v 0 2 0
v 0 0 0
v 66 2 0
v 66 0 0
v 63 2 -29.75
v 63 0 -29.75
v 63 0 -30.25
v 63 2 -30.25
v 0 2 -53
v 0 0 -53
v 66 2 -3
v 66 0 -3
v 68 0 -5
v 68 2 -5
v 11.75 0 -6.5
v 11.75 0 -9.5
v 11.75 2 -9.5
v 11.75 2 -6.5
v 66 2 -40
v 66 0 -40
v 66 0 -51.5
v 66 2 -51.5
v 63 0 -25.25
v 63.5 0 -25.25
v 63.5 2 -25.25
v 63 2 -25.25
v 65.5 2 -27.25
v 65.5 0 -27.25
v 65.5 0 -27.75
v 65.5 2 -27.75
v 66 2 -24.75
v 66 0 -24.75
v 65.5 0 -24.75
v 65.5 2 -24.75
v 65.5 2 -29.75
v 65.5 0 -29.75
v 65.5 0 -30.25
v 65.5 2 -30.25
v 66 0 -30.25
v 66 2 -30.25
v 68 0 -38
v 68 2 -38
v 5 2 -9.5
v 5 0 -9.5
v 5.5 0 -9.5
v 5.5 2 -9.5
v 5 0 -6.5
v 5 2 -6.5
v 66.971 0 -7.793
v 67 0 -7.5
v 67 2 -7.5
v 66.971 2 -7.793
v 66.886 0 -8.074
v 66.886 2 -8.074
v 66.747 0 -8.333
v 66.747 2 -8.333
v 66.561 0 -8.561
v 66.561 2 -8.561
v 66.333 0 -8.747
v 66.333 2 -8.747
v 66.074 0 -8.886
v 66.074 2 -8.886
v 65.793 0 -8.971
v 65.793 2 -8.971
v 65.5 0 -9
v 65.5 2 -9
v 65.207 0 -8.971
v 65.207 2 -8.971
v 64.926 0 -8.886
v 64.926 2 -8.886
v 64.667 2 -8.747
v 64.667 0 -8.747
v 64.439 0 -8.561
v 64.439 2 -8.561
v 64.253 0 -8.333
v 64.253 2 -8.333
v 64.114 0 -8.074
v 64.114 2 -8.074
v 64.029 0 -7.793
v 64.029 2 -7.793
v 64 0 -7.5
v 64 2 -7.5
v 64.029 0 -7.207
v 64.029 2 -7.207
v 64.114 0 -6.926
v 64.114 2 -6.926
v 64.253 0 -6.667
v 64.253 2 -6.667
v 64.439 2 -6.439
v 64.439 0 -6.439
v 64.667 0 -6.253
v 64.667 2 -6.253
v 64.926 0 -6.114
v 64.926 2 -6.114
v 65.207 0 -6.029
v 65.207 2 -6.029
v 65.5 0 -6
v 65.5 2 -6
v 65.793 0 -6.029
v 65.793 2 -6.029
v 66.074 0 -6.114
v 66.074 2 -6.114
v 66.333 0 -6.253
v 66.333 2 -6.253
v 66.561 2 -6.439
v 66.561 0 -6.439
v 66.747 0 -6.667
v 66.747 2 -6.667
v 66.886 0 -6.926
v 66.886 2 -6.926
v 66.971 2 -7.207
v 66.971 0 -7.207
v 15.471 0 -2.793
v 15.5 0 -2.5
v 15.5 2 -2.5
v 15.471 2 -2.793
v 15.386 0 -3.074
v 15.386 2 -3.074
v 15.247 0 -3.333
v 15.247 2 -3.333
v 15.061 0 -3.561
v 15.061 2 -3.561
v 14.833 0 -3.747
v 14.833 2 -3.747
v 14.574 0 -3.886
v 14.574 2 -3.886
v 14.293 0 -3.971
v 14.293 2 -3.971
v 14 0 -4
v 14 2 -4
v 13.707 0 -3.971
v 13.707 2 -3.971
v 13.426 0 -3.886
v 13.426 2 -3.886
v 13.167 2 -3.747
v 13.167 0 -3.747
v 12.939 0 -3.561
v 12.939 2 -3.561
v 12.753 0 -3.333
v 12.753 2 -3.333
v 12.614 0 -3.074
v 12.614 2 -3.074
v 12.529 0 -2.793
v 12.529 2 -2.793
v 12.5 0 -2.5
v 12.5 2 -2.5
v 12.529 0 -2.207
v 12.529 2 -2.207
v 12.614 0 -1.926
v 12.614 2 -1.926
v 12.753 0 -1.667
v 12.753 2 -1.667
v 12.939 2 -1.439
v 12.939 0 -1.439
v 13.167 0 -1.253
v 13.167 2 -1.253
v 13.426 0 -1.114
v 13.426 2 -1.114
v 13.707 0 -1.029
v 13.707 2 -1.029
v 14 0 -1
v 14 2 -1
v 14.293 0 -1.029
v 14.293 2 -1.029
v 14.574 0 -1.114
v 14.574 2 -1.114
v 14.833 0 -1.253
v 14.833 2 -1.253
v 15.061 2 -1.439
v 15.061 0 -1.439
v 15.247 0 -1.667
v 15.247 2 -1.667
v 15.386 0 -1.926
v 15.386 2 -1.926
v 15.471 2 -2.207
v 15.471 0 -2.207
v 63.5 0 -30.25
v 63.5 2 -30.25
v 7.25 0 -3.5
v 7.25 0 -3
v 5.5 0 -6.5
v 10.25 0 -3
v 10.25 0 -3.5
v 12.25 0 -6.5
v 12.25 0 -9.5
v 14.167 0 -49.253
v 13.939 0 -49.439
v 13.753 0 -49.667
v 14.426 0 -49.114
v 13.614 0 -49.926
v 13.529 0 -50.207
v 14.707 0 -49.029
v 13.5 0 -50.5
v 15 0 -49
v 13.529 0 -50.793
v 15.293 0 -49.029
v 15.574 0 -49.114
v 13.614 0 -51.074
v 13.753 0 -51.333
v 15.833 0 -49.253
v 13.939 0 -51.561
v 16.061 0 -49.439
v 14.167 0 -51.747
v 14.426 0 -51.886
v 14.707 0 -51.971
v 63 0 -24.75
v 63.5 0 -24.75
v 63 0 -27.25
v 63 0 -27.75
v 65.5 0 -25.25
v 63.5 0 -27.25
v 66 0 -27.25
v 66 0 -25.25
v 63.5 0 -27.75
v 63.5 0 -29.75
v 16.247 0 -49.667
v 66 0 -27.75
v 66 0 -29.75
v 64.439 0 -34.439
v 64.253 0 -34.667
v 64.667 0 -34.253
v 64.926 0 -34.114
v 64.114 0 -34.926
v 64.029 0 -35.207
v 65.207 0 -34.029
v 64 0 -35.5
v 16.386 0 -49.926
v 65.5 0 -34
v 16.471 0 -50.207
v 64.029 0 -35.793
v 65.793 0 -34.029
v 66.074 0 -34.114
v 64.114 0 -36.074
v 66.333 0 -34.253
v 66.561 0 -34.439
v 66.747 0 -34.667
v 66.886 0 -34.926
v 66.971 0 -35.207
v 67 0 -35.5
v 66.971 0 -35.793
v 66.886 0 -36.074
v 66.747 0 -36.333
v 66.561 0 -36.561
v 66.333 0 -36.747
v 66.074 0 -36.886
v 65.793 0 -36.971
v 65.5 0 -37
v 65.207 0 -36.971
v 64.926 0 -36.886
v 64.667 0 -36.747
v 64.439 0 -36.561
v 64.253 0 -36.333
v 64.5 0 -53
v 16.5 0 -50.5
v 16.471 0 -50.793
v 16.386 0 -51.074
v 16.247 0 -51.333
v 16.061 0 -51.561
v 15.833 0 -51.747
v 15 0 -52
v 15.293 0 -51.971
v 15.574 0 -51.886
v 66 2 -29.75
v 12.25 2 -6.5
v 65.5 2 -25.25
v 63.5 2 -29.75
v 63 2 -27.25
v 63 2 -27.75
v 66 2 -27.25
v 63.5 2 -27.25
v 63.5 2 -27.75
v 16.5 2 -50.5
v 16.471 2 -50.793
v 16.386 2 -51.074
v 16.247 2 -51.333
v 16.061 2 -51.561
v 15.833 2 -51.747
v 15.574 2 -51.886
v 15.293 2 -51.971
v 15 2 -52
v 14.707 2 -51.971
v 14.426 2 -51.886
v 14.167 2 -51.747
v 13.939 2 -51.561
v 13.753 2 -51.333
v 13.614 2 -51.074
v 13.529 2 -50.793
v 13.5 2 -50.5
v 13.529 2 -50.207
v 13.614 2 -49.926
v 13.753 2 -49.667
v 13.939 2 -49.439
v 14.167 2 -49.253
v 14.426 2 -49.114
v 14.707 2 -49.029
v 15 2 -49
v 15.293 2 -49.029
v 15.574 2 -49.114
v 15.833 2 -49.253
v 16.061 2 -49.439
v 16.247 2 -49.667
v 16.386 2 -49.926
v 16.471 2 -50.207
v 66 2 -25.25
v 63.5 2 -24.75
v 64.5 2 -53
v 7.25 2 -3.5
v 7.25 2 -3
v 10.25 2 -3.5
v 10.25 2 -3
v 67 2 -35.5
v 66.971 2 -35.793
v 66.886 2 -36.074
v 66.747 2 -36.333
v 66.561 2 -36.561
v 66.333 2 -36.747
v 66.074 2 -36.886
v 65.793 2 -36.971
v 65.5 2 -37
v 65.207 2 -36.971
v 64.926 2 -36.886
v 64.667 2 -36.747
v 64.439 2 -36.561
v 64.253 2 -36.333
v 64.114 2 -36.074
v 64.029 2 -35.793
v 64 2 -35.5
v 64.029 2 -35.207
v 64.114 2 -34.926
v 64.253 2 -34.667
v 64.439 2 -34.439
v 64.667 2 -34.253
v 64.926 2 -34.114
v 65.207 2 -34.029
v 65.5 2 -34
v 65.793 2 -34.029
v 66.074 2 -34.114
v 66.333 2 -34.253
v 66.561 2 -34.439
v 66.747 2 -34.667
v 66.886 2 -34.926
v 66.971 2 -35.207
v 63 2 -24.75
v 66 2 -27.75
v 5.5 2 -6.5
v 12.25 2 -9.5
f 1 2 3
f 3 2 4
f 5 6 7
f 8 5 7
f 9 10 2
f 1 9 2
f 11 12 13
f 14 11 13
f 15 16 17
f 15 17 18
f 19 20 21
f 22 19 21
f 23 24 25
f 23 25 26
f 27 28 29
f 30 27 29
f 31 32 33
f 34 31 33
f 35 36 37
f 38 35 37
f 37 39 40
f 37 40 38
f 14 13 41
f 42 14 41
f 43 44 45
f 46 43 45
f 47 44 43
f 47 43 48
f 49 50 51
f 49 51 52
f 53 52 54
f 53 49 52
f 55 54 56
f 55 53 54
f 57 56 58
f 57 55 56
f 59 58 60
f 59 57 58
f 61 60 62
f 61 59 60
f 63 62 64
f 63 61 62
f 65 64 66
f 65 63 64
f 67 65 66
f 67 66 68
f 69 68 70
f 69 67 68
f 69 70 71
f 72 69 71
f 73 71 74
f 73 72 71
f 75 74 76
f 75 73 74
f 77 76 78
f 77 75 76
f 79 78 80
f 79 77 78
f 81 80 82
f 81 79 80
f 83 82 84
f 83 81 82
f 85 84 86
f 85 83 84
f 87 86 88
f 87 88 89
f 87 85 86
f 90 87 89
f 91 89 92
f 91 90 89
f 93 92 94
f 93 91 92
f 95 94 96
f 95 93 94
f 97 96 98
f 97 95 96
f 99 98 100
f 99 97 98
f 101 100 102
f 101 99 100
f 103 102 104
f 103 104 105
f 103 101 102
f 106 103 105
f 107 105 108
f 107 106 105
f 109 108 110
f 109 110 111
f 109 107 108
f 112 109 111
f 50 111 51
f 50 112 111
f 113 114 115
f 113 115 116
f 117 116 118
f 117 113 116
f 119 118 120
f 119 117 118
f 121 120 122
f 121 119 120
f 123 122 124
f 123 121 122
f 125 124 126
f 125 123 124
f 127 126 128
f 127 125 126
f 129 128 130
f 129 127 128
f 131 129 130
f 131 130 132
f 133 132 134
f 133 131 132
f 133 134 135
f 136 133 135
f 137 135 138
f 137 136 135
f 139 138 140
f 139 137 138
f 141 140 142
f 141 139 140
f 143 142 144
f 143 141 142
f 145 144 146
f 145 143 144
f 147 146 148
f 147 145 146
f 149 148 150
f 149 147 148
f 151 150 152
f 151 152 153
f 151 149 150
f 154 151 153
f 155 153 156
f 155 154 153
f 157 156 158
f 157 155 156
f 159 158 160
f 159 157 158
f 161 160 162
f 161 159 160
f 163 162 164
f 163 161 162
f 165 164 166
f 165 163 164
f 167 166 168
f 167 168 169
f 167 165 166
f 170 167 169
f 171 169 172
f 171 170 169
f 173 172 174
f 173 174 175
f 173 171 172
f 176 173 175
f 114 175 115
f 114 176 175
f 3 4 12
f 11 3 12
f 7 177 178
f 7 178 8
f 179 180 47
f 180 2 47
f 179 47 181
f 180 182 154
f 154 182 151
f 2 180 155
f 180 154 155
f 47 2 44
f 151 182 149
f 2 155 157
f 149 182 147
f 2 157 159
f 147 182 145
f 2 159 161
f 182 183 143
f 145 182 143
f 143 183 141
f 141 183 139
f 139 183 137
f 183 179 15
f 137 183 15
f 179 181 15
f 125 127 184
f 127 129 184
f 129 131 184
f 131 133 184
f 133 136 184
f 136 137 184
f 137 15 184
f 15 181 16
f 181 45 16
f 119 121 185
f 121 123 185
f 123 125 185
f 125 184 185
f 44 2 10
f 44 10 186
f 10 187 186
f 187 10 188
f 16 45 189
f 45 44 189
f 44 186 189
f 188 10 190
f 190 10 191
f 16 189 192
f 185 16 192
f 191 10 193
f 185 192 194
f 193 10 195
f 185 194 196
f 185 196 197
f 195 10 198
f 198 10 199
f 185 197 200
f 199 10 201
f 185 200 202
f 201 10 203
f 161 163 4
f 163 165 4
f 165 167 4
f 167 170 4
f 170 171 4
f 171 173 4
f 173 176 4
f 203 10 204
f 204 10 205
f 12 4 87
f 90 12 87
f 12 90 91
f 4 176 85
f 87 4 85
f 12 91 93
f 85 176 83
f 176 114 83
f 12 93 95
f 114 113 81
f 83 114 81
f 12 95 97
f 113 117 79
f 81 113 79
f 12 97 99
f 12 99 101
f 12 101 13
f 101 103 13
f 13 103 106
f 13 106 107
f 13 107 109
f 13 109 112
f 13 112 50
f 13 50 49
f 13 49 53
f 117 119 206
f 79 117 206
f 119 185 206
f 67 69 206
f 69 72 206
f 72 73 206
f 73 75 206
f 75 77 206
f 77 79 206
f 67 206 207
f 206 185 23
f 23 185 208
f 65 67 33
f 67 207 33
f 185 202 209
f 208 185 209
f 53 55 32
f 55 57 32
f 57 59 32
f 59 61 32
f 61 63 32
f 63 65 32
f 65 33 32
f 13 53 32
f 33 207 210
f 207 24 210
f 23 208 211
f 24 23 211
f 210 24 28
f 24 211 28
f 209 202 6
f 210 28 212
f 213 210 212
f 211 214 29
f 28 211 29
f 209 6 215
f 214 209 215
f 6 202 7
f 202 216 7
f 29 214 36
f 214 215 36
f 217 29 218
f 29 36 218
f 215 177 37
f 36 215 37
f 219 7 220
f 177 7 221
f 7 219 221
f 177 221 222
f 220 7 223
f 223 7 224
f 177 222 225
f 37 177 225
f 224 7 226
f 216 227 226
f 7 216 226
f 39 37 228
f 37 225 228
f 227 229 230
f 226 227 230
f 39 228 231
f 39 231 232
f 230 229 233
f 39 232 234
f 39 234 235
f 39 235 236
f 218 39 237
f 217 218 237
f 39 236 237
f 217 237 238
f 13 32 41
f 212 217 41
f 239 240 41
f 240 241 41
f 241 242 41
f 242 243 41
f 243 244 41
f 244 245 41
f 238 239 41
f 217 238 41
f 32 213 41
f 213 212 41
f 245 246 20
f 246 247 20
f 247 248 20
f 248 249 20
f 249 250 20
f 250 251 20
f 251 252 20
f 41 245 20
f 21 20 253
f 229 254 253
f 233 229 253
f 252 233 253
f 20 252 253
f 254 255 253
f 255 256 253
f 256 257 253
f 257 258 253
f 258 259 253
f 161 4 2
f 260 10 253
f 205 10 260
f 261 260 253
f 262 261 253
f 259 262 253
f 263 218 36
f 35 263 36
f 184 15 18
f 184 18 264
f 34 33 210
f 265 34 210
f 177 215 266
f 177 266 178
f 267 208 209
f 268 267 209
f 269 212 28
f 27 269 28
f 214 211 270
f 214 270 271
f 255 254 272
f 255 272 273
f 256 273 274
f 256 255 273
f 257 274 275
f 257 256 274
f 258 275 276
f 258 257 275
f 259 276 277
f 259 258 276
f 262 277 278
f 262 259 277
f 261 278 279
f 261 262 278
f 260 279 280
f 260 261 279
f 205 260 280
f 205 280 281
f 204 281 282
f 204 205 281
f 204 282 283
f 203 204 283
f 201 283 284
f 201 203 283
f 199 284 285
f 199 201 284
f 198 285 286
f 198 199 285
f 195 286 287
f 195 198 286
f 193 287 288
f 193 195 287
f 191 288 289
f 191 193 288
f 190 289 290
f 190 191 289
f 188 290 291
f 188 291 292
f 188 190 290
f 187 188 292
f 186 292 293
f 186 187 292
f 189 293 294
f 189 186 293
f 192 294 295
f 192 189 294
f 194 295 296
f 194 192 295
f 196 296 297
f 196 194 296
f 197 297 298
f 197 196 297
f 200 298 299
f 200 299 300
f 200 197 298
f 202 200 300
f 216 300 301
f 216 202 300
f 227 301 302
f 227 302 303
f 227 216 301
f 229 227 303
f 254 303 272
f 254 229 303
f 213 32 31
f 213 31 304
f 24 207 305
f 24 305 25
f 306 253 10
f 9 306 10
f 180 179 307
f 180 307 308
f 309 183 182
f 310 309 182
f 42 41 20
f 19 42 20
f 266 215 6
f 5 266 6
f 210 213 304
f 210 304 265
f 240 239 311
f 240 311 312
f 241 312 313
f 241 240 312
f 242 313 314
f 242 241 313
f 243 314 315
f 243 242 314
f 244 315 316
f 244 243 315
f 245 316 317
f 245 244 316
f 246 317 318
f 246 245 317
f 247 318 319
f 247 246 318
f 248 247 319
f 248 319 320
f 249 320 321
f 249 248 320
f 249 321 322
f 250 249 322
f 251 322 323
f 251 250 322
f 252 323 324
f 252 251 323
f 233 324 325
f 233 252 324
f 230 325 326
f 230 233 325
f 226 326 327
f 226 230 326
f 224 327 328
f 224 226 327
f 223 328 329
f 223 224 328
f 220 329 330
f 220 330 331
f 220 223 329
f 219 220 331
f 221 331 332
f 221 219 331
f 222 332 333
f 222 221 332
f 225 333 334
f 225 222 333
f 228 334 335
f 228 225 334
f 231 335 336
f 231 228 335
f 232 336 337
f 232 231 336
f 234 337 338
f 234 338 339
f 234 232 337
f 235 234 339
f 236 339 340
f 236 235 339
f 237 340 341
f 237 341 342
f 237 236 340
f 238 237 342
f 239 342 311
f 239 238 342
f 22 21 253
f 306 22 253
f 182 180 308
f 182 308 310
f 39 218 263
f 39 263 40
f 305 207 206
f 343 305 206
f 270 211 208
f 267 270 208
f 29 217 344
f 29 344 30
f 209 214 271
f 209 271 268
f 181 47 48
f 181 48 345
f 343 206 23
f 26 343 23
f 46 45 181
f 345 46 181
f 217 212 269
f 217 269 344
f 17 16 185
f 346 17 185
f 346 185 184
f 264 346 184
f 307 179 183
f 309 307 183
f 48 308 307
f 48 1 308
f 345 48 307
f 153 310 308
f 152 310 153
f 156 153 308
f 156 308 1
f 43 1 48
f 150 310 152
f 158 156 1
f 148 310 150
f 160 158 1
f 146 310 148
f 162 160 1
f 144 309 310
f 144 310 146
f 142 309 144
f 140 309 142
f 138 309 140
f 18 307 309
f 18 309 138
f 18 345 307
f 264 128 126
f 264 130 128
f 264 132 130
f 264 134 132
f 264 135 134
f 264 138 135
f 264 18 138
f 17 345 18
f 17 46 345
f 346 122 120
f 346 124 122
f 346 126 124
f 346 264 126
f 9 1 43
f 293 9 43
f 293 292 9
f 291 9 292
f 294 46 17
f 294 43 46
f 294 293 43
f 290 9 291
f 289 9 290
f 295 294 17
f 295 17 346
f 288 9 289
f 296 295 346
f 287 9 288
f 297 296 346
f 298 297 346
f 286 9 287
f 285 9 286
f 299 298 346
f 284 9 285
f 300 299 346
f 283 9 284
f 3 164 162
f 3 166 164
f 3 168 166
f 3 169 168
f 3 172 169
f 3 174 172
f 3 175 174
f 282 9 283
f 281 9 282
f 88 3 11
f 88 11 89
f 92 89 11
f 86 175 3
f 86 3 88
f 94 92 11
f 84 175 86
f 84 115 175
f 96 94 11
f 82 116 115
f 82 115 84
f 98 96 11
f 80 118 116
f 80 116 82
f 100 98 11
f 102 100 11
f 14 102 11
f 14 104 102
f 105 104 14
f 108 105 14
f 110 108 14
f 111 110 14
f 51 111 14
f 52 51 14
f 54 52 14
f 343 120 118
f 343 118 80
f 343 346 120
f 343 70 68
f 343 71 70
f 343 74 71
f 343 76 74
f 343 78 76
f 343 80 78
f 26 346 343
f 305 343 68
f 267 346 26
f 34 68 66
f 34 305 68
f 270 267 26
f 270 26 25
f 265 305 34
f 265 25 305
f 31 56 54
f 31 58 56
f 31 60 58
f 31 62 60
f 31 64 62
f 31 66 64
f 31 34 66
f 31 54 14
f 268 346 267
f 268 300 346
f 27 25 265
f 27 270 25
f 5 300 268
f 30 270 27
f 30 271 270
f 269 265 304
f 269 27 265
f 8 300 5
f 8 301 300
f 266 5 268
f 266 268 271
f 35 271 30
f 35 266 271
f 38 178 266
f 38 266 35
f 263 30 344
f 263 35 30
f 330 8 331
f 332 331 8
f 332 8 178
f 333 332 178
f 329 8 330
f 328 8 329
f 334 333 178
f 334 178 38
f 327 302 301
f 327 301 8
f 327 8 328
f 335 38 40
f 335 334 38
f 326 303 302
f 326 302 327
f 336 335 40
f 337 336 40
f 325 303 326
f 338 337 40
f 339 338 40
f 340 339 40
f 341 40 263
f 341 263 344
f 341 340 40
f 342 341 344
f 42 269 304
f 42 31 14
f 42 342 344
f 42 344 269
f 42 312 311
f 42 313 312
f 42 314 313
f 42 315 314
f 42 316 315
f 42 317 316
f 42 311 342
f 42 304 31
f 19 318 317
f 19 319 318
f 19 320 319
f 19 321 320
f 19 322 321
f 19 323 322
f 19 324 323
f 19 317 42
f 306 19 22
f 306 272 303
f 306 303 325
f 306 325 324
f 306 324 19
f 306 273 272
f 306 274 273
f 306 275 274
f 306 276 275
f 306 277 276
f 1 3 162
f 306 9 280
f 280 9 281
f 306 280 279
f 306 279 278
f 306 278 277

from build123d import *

# Parameters (mm, degrees)
SKETCH1_R           = 1.5
BOSS_EXTRUDE1_DEPTH = 2
SKETCH5_W           = 0.5
SKETCH5_H           = 3
SKETCH5_W_2         = 3
SKETCH5_H_2         = 0.5
CUT_EXTRUDE2_DEPTH  = 3
SKETCH6_W           = 0.5
SKETCH6_H           = 0.5
CUT_EXTRUDE3_DEPTH  = 3


with BuildPart() as part:
    # Sketch1 → Boss-Extrude1 (new body)
    with BuildSketch(Plane(origin=(0, 0, 0), x_dir=(1, 0, 0), z_dir=(0, 1, 0))):
        Polygon((0, 53), (0, 0), (66, 0), (66, 3), (68, 5), (68, 38), (66, 40), (66, 51.5), (64.5, 53), align=None)
        with Locations((15, 50.5)):
            Circle(SKETCH1_R, mode=Mode.SUBTRACT)
        with Locations((14, 2.5)):
            Circle(SKETCH1_R, mode=Mode.SUBTRACT)
        with Locations((65.5, 7.5)):
            Circle(SKETCH1_R, mode=Mode.SUBTRACT)
        with Locations((65.5, 35.5)):
            Circle(SKETCH1_R, mode=Mode.SUBTRACT)
    extrude(amount=BOSS_EXTRUDE1_DEPTH)

    # Sketch5 → Cut-Extrude2 (cut, through all)
    with BuildSketch(Plane.XZ):
        with Locations((5.25, -8)):
            Rectangle(SKETCH5_W, SKETCH5_H)
        with Locations((12, -8)):
            Rectangle(SKETCH5_W, SKETCH5_H)
        with Locations((8.75, -3.25)):
            Rectangle(SKETCH5_W_2, SKETCH5_H_2)
    extrude(amount=-CUT_EXTRUDE2_DEPTH, mode=Mode.SUBTRACT)

    # Sketch6 → Cut-Extrude3 (cut, through all)
    with BuildSketch(Plane(origin=(0, 0, 0), x_dir=(-1, 0, 0), z_dir=(0, -1, 0))):
        with Locations((-63.25, 25)):
            Rectangle(SKETCH6_W, SKETCH6_H)
        with Locations((-65.75, 25)):
            Rectangle(SKETCH6_W, SKETCH6_H)
        with Locations((-65.75, 27.5)):
            Rectangle(SKETCH6_W, SKETCH6_H)
        with Locations((-65.75, 30)):
            Rectangle(SKETCH6_W, SKETCH6_H)
        with Locations((-63.25, 30)):
            Rectangle(SKETCH6_W, SKETCH6_H)
        with Locations((-63.25, 27.5)):
            Rectangle(SKETCH6_W, SKETCH6_H)
    extrude(amount=-CUT_EXTRUDE3_DEPTH, mode=Mode.SUBTRACT)


solid = part.part
